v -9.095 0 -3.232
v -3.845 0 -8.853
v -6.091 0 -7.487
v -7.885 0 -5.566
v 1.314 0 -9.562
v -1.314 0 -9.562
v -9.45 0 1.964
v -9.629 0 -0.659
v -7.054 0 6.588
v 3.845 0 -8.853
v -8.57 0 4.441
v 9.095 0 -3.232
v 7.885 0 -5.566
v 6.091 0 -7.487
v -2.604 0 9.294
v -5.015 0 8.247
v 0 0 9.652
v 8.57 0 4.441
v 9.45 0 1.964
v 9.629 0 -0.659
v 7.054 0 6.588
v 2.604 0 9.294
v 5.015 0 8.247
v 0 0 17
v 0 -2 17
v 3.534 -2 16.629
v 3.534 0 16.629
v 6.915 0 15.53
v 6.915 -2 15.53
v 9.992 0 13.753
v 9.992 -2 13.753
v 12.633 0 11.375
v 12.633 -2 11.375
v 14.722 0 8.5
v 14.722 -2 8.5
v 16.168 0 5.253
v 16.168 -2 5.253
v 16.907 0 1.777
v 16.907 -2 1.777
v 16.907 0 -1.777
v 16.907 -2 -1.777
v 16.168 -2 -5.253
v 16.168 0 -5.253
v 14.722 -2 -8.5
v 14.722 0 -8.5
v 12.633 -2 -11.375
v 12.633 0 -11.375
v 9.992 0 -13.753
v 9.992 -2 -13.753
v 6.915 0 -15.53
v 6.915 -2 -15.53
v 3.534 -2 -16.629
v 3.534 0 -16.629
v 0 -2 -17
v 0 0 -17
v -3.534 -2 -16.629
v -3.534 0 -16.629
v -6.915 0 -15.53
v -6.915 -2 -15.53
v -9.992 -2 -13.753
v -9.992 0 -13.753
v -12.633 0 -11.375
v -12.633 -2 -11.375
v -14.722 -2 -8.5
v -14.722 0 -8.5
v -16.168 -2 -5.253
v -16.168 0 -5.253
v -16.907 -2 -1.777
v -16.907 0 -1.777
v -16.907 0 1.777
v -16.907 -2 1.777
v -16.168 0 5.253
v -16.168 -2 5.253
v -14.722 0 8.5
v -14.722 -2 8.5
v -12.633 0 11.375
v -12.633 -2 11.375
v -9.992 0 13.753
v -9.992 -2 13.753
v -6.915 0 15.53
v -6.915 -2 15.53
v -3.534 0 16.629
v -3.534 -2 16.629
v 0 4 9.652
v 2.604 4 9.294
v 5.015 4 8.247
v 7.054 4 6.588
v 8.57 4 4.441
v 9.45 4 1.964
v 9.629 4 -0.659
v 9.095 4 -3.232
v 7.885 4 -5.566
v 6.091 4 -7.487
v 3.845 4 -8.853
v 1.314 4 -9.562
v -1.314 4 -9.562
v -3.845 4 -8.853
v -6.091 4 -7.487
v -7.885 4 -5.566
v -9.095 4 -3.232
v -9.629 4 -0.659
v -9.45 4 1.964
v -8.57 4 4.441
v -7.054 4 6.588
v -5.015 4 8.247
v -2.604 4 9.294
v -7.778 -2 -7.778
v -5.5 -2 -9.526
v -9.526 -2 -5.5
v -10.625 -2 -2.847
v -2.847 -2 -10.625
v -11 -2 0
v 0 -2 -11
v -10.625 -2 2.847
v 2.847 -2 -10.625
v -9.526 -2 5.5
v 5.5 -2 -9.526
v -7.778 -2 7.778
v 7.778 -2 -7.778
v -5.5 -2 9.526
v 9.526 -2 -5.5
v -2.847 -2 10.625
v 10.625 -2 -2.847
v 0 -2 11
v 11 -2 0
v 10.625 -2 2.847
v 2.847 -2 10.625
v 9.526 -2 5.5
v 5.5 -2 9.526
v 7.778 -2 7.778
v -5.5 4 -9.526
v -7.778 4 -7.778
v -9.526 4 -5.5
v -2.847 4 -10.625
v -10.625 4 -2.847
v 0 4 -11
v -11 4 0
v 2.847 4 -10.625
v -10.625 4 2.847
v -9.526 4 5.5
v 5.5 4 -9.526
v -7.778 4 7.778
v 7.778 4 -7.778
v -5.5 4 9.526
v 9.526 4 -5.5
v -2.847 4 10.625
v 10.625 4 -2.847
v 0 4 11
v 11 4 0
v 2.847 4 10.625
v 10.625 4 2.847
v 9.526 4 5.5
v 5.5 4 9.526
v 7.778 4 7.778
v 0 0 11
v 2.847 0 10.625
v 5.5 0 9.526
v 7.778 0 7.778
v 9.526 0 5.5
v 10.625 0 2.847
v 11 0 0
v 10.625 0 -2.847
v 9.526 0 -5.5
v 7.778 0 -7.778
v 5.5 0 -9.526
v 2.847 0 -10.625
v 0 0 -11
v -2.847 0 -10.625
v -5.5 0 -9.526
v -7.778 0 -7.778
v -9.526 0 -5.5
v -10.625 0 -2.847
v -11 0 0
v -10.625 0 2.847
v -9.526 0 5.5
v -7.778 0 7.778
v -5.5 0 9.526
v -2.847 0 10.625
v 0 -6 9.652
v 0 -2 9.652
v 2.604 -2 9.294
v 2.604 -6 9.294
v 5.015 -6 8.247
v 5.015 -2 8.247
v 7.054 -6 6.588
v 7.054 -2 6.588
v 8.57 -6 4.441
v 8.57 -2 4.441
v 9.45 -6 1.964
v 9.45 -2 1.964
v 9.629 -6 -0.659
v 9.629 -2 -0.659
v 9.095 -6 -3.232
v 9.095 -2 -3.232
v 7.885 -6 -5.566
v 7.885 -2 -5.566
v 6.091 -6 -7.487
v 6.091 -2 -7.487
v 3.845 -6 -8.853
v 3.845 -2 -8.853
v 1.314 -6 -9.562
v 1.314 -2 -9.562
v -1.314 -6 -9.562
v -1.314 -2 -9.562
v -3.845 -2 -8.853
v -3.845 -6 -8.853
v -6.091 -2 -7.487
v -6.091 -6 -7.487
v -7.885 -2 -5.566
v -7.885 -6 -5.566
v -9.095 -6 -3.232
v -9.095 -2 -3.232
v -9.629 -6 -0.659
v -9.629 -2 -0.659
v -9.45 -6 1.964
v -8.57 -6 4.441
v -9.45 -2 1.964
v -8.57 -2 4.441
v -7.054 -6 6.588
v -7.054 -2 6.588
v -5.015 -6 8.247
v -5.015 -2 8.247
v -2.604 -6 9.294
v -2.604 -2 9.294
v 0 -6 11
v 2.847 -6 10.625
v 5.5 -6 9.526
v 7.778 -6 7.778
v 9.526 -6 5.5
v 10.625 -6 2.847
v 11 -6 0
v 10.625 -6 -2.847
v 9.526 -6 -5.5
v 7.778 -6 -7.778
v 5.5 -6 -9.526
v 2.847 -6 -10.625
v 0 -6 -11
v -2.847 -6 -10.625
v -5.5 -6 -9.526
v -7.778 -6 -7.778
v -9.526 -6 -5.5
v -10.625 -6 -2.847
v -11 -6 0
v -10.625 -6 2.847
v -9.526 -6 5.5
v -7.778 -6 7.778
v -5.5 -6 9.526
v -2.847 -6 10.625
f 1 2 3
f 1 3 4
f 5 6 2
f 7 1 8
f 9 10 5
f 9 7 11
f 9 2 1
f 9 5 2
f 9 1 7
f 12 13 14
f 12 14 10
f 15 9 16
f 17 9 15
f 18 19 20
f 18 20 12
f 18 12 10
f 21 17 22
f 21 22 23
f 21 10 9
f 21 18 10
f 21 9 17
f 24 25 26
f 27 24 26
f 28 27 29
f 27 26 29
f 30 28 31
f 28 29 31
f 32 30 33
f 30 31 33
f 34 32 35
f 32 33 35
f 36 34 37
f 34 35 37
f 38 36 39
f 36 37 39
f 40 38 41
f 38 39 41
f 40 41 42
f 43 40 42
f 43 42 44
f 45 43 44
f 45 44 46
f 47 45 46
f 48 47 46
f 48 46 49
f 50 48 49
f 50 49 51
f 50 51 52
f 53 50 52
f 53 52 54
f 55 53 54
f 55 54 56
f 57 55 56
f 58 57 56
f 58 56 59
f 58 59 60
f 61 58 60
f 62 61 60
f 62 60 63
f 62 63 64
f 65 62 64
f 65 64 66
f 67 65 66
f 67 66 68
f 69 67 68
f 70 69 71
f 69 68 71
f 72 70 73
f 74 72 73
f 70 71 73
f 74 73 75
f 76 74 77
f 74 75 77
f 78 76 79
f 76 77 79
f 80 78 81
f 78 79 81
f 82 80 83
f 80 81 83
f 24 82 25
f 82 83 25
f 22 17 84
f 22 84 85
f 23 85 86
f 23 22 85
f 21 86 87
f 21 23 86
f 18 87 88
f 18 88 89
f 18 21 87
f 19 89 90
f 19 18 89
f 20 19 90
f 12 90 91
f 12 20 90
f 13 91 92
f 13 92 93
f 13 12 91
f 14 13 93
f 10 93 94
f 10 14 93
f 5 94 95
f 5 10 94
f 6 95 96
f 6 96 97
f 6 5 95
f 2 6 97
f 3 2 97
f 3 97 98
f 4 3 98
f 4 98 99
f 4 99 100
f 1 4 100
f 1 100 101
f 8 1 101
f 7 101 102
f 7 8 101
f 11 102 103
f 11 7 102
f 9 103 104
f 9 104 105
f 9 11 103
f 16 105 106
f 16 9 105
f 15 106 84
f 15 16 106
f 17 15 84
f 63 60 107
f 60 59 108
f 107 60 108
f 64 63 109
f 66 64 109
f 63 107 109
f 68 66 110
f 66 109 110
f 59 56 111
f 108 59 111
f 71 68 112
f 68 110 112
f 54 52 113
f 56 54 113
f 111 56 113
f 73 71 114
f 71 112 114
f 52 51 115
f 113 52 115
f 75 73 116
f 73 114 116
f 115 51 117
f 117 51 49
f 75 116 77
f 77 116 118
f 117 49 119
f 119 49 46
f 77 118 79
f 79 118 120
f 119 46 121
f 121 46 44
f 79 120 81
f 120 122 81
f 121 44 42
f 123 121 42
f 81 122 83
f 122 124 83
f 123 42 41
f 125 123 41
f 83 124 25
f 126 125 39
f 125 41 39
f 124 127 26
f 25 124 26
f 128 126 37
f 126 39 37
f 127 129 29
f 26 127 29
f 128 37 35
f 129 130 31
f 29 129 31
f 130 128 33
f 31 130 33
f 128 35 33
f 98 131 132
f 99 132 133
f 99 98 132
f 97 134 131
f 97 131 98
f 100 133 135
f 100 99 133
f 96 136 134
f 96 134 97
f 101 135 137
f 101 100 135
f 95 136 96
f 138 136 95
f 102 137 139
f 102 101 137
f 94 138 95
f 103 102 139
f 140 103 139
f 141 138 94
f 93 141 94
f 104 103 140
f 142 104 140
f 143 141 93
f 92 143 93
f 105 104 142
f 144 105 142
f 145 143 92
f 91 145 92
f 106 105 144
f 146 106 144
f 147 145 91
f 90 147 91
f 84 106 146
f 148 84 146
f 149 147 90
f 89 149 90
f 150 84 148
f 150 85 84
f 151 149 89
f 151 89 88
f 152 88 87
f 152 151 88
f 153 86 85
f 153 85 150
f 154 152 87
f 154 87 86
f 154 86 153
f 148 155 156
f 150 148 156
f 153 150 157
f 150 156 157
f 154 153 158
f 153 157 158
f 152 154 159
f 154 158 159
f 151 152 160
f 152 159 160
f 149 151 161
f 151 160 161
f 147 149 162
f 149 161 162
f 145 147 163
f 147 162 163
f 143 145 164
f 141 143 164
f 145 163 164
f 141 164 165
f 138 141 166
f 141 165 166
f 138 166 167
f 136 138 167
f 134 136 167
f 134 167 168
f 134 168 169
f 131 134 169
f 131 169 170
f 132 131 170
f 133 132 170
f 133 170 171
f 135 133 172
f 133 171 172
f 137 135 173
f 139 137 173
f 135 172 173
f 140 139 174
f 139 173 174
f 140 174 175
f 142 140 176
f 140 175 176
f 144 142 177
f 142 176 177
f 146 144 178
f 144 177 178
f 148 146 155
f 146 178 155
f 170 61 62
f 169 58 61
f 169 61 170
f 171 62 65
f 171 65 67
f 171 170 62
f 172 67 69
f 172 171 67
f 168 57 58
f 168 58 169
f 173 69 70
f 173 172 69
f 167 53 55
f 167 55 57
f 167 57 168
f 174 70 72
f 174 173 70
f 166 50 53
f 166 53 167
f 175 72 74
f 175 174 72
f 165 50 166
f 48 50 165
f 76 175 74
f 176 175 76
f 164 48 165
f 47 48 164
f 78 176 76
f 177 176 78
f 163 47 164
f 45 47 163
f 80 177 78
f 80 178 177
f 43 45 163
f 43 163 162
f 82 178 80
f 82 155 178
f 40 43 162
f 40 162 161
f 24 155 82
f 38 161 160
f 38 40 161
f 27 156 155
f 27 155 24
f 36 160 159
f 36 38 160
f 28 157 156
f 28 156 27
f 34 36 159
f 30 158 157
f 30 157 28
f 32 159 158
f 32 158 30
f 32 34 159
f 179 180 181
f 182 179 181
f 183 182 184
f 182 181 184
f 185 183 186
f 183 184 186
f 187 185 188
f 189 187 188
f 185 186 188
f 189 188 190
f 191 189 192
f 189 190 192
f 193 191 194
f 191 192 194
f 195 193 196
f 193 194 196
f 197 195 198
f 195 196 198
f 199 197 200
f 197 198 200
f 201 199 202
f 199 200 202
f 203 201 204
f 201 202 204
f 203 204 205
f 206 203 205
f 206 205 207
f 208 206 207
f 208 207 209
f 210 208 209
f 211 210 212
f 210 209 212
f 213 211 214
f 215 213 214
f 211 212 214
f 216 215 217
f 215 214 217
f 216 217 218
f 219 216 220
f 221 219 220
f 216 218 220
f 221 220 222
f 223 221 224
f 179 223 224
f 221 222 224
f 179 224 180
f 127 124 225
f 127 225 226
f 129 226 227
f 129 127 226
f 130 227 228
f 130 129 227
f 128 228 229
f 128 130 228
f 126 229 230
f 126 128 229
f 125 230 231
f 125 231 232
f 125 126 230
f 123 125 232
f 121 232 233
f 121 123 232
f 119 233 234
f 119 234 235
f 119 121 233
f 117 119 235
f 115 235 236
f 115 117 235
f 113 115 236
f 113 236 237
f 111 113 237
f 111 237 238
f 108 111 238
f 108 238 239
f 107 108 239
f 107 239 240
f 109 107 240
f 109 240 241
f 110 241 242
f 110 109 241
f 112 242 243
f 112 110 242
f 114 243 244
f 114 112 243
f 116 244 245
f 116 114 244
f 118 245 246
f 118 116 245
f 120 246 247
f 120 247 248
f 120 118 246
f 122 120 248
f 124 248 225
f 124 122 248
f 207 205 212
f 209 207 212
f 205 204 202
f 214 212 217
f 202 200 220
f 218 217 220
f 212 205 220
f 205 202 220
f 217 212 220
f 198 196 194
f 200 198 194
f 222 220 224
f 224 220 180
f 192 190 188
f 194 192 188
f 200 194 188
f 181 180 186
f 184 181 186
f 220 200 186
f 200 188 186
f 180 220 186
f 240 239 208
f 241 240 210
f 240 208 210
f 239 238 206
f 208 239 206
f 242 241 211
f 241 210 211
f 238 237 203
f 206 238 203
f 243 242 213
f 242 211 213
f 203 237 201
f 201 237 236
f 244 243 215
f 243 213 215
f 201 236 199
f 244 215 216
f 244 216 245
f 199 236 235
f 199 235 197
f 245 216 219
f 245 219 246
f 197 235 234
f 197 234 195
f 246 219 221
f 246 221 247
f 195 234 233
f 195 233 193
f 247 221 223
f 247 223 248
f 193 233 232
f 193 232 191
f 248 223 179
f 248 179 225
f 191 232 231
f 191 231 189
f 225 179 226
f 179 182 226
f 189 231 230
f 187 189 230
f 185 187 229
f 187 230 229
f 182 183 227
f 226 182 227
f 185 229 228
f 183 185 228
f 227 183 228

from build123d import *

# Parameters (mm, degrees)
SKETCH1_R           = 17
BOSS_EXTRUDE1_DEPTH = 1
SKETCH2_R           = 11
SKETCH2_R_2         = 9.652
BOSS_EXTRUDE2_DEPTH = 4


with BuildPart() as part:
    # Sketch1 → Boss-Extrude1 (new body)
    with BuildSketch(Plane(origin=(0, 0, 0), x_dir=(1, 0, 0), z_dir=(0, 1, 0))):
        with Locations(Location((0, 0, 0), (0, 0, 270))):
            Circle(SKETCH1_R)
    boss_extrude1 = extrude(amount=-BOSS_EXTRUDE1_DEPTH)

    # Sketch2 → Boss-Extrude2 (add)
    with BuildSketch(Plane(origin=(0, 0, 0), x_dir=(1, 0, 0), z_dir=(0, 1, 0))):
        with Locations(Location((0, 0, 0), (0, 0, 270))):
            Circle(SKETCH2_R)
        with Locations(Location((0, 0, 0), (0, 0, 270))):
            Circle(SKETCH2_R_2, mode=Mode.SUBTRACT)
    boss_extrude2 = extrude(amount=BOSS_EXTRUDE2_DEPTH)

    # Mirror1: Boss-Extrude1, Boss-Extrude2 across plane
    add(boss_extrude1.mirror(Plane.ZX.offset(-1)))
    add(boss_extrude2.mirror(Plane.ZX.offset(-1)))


solid = part.part
